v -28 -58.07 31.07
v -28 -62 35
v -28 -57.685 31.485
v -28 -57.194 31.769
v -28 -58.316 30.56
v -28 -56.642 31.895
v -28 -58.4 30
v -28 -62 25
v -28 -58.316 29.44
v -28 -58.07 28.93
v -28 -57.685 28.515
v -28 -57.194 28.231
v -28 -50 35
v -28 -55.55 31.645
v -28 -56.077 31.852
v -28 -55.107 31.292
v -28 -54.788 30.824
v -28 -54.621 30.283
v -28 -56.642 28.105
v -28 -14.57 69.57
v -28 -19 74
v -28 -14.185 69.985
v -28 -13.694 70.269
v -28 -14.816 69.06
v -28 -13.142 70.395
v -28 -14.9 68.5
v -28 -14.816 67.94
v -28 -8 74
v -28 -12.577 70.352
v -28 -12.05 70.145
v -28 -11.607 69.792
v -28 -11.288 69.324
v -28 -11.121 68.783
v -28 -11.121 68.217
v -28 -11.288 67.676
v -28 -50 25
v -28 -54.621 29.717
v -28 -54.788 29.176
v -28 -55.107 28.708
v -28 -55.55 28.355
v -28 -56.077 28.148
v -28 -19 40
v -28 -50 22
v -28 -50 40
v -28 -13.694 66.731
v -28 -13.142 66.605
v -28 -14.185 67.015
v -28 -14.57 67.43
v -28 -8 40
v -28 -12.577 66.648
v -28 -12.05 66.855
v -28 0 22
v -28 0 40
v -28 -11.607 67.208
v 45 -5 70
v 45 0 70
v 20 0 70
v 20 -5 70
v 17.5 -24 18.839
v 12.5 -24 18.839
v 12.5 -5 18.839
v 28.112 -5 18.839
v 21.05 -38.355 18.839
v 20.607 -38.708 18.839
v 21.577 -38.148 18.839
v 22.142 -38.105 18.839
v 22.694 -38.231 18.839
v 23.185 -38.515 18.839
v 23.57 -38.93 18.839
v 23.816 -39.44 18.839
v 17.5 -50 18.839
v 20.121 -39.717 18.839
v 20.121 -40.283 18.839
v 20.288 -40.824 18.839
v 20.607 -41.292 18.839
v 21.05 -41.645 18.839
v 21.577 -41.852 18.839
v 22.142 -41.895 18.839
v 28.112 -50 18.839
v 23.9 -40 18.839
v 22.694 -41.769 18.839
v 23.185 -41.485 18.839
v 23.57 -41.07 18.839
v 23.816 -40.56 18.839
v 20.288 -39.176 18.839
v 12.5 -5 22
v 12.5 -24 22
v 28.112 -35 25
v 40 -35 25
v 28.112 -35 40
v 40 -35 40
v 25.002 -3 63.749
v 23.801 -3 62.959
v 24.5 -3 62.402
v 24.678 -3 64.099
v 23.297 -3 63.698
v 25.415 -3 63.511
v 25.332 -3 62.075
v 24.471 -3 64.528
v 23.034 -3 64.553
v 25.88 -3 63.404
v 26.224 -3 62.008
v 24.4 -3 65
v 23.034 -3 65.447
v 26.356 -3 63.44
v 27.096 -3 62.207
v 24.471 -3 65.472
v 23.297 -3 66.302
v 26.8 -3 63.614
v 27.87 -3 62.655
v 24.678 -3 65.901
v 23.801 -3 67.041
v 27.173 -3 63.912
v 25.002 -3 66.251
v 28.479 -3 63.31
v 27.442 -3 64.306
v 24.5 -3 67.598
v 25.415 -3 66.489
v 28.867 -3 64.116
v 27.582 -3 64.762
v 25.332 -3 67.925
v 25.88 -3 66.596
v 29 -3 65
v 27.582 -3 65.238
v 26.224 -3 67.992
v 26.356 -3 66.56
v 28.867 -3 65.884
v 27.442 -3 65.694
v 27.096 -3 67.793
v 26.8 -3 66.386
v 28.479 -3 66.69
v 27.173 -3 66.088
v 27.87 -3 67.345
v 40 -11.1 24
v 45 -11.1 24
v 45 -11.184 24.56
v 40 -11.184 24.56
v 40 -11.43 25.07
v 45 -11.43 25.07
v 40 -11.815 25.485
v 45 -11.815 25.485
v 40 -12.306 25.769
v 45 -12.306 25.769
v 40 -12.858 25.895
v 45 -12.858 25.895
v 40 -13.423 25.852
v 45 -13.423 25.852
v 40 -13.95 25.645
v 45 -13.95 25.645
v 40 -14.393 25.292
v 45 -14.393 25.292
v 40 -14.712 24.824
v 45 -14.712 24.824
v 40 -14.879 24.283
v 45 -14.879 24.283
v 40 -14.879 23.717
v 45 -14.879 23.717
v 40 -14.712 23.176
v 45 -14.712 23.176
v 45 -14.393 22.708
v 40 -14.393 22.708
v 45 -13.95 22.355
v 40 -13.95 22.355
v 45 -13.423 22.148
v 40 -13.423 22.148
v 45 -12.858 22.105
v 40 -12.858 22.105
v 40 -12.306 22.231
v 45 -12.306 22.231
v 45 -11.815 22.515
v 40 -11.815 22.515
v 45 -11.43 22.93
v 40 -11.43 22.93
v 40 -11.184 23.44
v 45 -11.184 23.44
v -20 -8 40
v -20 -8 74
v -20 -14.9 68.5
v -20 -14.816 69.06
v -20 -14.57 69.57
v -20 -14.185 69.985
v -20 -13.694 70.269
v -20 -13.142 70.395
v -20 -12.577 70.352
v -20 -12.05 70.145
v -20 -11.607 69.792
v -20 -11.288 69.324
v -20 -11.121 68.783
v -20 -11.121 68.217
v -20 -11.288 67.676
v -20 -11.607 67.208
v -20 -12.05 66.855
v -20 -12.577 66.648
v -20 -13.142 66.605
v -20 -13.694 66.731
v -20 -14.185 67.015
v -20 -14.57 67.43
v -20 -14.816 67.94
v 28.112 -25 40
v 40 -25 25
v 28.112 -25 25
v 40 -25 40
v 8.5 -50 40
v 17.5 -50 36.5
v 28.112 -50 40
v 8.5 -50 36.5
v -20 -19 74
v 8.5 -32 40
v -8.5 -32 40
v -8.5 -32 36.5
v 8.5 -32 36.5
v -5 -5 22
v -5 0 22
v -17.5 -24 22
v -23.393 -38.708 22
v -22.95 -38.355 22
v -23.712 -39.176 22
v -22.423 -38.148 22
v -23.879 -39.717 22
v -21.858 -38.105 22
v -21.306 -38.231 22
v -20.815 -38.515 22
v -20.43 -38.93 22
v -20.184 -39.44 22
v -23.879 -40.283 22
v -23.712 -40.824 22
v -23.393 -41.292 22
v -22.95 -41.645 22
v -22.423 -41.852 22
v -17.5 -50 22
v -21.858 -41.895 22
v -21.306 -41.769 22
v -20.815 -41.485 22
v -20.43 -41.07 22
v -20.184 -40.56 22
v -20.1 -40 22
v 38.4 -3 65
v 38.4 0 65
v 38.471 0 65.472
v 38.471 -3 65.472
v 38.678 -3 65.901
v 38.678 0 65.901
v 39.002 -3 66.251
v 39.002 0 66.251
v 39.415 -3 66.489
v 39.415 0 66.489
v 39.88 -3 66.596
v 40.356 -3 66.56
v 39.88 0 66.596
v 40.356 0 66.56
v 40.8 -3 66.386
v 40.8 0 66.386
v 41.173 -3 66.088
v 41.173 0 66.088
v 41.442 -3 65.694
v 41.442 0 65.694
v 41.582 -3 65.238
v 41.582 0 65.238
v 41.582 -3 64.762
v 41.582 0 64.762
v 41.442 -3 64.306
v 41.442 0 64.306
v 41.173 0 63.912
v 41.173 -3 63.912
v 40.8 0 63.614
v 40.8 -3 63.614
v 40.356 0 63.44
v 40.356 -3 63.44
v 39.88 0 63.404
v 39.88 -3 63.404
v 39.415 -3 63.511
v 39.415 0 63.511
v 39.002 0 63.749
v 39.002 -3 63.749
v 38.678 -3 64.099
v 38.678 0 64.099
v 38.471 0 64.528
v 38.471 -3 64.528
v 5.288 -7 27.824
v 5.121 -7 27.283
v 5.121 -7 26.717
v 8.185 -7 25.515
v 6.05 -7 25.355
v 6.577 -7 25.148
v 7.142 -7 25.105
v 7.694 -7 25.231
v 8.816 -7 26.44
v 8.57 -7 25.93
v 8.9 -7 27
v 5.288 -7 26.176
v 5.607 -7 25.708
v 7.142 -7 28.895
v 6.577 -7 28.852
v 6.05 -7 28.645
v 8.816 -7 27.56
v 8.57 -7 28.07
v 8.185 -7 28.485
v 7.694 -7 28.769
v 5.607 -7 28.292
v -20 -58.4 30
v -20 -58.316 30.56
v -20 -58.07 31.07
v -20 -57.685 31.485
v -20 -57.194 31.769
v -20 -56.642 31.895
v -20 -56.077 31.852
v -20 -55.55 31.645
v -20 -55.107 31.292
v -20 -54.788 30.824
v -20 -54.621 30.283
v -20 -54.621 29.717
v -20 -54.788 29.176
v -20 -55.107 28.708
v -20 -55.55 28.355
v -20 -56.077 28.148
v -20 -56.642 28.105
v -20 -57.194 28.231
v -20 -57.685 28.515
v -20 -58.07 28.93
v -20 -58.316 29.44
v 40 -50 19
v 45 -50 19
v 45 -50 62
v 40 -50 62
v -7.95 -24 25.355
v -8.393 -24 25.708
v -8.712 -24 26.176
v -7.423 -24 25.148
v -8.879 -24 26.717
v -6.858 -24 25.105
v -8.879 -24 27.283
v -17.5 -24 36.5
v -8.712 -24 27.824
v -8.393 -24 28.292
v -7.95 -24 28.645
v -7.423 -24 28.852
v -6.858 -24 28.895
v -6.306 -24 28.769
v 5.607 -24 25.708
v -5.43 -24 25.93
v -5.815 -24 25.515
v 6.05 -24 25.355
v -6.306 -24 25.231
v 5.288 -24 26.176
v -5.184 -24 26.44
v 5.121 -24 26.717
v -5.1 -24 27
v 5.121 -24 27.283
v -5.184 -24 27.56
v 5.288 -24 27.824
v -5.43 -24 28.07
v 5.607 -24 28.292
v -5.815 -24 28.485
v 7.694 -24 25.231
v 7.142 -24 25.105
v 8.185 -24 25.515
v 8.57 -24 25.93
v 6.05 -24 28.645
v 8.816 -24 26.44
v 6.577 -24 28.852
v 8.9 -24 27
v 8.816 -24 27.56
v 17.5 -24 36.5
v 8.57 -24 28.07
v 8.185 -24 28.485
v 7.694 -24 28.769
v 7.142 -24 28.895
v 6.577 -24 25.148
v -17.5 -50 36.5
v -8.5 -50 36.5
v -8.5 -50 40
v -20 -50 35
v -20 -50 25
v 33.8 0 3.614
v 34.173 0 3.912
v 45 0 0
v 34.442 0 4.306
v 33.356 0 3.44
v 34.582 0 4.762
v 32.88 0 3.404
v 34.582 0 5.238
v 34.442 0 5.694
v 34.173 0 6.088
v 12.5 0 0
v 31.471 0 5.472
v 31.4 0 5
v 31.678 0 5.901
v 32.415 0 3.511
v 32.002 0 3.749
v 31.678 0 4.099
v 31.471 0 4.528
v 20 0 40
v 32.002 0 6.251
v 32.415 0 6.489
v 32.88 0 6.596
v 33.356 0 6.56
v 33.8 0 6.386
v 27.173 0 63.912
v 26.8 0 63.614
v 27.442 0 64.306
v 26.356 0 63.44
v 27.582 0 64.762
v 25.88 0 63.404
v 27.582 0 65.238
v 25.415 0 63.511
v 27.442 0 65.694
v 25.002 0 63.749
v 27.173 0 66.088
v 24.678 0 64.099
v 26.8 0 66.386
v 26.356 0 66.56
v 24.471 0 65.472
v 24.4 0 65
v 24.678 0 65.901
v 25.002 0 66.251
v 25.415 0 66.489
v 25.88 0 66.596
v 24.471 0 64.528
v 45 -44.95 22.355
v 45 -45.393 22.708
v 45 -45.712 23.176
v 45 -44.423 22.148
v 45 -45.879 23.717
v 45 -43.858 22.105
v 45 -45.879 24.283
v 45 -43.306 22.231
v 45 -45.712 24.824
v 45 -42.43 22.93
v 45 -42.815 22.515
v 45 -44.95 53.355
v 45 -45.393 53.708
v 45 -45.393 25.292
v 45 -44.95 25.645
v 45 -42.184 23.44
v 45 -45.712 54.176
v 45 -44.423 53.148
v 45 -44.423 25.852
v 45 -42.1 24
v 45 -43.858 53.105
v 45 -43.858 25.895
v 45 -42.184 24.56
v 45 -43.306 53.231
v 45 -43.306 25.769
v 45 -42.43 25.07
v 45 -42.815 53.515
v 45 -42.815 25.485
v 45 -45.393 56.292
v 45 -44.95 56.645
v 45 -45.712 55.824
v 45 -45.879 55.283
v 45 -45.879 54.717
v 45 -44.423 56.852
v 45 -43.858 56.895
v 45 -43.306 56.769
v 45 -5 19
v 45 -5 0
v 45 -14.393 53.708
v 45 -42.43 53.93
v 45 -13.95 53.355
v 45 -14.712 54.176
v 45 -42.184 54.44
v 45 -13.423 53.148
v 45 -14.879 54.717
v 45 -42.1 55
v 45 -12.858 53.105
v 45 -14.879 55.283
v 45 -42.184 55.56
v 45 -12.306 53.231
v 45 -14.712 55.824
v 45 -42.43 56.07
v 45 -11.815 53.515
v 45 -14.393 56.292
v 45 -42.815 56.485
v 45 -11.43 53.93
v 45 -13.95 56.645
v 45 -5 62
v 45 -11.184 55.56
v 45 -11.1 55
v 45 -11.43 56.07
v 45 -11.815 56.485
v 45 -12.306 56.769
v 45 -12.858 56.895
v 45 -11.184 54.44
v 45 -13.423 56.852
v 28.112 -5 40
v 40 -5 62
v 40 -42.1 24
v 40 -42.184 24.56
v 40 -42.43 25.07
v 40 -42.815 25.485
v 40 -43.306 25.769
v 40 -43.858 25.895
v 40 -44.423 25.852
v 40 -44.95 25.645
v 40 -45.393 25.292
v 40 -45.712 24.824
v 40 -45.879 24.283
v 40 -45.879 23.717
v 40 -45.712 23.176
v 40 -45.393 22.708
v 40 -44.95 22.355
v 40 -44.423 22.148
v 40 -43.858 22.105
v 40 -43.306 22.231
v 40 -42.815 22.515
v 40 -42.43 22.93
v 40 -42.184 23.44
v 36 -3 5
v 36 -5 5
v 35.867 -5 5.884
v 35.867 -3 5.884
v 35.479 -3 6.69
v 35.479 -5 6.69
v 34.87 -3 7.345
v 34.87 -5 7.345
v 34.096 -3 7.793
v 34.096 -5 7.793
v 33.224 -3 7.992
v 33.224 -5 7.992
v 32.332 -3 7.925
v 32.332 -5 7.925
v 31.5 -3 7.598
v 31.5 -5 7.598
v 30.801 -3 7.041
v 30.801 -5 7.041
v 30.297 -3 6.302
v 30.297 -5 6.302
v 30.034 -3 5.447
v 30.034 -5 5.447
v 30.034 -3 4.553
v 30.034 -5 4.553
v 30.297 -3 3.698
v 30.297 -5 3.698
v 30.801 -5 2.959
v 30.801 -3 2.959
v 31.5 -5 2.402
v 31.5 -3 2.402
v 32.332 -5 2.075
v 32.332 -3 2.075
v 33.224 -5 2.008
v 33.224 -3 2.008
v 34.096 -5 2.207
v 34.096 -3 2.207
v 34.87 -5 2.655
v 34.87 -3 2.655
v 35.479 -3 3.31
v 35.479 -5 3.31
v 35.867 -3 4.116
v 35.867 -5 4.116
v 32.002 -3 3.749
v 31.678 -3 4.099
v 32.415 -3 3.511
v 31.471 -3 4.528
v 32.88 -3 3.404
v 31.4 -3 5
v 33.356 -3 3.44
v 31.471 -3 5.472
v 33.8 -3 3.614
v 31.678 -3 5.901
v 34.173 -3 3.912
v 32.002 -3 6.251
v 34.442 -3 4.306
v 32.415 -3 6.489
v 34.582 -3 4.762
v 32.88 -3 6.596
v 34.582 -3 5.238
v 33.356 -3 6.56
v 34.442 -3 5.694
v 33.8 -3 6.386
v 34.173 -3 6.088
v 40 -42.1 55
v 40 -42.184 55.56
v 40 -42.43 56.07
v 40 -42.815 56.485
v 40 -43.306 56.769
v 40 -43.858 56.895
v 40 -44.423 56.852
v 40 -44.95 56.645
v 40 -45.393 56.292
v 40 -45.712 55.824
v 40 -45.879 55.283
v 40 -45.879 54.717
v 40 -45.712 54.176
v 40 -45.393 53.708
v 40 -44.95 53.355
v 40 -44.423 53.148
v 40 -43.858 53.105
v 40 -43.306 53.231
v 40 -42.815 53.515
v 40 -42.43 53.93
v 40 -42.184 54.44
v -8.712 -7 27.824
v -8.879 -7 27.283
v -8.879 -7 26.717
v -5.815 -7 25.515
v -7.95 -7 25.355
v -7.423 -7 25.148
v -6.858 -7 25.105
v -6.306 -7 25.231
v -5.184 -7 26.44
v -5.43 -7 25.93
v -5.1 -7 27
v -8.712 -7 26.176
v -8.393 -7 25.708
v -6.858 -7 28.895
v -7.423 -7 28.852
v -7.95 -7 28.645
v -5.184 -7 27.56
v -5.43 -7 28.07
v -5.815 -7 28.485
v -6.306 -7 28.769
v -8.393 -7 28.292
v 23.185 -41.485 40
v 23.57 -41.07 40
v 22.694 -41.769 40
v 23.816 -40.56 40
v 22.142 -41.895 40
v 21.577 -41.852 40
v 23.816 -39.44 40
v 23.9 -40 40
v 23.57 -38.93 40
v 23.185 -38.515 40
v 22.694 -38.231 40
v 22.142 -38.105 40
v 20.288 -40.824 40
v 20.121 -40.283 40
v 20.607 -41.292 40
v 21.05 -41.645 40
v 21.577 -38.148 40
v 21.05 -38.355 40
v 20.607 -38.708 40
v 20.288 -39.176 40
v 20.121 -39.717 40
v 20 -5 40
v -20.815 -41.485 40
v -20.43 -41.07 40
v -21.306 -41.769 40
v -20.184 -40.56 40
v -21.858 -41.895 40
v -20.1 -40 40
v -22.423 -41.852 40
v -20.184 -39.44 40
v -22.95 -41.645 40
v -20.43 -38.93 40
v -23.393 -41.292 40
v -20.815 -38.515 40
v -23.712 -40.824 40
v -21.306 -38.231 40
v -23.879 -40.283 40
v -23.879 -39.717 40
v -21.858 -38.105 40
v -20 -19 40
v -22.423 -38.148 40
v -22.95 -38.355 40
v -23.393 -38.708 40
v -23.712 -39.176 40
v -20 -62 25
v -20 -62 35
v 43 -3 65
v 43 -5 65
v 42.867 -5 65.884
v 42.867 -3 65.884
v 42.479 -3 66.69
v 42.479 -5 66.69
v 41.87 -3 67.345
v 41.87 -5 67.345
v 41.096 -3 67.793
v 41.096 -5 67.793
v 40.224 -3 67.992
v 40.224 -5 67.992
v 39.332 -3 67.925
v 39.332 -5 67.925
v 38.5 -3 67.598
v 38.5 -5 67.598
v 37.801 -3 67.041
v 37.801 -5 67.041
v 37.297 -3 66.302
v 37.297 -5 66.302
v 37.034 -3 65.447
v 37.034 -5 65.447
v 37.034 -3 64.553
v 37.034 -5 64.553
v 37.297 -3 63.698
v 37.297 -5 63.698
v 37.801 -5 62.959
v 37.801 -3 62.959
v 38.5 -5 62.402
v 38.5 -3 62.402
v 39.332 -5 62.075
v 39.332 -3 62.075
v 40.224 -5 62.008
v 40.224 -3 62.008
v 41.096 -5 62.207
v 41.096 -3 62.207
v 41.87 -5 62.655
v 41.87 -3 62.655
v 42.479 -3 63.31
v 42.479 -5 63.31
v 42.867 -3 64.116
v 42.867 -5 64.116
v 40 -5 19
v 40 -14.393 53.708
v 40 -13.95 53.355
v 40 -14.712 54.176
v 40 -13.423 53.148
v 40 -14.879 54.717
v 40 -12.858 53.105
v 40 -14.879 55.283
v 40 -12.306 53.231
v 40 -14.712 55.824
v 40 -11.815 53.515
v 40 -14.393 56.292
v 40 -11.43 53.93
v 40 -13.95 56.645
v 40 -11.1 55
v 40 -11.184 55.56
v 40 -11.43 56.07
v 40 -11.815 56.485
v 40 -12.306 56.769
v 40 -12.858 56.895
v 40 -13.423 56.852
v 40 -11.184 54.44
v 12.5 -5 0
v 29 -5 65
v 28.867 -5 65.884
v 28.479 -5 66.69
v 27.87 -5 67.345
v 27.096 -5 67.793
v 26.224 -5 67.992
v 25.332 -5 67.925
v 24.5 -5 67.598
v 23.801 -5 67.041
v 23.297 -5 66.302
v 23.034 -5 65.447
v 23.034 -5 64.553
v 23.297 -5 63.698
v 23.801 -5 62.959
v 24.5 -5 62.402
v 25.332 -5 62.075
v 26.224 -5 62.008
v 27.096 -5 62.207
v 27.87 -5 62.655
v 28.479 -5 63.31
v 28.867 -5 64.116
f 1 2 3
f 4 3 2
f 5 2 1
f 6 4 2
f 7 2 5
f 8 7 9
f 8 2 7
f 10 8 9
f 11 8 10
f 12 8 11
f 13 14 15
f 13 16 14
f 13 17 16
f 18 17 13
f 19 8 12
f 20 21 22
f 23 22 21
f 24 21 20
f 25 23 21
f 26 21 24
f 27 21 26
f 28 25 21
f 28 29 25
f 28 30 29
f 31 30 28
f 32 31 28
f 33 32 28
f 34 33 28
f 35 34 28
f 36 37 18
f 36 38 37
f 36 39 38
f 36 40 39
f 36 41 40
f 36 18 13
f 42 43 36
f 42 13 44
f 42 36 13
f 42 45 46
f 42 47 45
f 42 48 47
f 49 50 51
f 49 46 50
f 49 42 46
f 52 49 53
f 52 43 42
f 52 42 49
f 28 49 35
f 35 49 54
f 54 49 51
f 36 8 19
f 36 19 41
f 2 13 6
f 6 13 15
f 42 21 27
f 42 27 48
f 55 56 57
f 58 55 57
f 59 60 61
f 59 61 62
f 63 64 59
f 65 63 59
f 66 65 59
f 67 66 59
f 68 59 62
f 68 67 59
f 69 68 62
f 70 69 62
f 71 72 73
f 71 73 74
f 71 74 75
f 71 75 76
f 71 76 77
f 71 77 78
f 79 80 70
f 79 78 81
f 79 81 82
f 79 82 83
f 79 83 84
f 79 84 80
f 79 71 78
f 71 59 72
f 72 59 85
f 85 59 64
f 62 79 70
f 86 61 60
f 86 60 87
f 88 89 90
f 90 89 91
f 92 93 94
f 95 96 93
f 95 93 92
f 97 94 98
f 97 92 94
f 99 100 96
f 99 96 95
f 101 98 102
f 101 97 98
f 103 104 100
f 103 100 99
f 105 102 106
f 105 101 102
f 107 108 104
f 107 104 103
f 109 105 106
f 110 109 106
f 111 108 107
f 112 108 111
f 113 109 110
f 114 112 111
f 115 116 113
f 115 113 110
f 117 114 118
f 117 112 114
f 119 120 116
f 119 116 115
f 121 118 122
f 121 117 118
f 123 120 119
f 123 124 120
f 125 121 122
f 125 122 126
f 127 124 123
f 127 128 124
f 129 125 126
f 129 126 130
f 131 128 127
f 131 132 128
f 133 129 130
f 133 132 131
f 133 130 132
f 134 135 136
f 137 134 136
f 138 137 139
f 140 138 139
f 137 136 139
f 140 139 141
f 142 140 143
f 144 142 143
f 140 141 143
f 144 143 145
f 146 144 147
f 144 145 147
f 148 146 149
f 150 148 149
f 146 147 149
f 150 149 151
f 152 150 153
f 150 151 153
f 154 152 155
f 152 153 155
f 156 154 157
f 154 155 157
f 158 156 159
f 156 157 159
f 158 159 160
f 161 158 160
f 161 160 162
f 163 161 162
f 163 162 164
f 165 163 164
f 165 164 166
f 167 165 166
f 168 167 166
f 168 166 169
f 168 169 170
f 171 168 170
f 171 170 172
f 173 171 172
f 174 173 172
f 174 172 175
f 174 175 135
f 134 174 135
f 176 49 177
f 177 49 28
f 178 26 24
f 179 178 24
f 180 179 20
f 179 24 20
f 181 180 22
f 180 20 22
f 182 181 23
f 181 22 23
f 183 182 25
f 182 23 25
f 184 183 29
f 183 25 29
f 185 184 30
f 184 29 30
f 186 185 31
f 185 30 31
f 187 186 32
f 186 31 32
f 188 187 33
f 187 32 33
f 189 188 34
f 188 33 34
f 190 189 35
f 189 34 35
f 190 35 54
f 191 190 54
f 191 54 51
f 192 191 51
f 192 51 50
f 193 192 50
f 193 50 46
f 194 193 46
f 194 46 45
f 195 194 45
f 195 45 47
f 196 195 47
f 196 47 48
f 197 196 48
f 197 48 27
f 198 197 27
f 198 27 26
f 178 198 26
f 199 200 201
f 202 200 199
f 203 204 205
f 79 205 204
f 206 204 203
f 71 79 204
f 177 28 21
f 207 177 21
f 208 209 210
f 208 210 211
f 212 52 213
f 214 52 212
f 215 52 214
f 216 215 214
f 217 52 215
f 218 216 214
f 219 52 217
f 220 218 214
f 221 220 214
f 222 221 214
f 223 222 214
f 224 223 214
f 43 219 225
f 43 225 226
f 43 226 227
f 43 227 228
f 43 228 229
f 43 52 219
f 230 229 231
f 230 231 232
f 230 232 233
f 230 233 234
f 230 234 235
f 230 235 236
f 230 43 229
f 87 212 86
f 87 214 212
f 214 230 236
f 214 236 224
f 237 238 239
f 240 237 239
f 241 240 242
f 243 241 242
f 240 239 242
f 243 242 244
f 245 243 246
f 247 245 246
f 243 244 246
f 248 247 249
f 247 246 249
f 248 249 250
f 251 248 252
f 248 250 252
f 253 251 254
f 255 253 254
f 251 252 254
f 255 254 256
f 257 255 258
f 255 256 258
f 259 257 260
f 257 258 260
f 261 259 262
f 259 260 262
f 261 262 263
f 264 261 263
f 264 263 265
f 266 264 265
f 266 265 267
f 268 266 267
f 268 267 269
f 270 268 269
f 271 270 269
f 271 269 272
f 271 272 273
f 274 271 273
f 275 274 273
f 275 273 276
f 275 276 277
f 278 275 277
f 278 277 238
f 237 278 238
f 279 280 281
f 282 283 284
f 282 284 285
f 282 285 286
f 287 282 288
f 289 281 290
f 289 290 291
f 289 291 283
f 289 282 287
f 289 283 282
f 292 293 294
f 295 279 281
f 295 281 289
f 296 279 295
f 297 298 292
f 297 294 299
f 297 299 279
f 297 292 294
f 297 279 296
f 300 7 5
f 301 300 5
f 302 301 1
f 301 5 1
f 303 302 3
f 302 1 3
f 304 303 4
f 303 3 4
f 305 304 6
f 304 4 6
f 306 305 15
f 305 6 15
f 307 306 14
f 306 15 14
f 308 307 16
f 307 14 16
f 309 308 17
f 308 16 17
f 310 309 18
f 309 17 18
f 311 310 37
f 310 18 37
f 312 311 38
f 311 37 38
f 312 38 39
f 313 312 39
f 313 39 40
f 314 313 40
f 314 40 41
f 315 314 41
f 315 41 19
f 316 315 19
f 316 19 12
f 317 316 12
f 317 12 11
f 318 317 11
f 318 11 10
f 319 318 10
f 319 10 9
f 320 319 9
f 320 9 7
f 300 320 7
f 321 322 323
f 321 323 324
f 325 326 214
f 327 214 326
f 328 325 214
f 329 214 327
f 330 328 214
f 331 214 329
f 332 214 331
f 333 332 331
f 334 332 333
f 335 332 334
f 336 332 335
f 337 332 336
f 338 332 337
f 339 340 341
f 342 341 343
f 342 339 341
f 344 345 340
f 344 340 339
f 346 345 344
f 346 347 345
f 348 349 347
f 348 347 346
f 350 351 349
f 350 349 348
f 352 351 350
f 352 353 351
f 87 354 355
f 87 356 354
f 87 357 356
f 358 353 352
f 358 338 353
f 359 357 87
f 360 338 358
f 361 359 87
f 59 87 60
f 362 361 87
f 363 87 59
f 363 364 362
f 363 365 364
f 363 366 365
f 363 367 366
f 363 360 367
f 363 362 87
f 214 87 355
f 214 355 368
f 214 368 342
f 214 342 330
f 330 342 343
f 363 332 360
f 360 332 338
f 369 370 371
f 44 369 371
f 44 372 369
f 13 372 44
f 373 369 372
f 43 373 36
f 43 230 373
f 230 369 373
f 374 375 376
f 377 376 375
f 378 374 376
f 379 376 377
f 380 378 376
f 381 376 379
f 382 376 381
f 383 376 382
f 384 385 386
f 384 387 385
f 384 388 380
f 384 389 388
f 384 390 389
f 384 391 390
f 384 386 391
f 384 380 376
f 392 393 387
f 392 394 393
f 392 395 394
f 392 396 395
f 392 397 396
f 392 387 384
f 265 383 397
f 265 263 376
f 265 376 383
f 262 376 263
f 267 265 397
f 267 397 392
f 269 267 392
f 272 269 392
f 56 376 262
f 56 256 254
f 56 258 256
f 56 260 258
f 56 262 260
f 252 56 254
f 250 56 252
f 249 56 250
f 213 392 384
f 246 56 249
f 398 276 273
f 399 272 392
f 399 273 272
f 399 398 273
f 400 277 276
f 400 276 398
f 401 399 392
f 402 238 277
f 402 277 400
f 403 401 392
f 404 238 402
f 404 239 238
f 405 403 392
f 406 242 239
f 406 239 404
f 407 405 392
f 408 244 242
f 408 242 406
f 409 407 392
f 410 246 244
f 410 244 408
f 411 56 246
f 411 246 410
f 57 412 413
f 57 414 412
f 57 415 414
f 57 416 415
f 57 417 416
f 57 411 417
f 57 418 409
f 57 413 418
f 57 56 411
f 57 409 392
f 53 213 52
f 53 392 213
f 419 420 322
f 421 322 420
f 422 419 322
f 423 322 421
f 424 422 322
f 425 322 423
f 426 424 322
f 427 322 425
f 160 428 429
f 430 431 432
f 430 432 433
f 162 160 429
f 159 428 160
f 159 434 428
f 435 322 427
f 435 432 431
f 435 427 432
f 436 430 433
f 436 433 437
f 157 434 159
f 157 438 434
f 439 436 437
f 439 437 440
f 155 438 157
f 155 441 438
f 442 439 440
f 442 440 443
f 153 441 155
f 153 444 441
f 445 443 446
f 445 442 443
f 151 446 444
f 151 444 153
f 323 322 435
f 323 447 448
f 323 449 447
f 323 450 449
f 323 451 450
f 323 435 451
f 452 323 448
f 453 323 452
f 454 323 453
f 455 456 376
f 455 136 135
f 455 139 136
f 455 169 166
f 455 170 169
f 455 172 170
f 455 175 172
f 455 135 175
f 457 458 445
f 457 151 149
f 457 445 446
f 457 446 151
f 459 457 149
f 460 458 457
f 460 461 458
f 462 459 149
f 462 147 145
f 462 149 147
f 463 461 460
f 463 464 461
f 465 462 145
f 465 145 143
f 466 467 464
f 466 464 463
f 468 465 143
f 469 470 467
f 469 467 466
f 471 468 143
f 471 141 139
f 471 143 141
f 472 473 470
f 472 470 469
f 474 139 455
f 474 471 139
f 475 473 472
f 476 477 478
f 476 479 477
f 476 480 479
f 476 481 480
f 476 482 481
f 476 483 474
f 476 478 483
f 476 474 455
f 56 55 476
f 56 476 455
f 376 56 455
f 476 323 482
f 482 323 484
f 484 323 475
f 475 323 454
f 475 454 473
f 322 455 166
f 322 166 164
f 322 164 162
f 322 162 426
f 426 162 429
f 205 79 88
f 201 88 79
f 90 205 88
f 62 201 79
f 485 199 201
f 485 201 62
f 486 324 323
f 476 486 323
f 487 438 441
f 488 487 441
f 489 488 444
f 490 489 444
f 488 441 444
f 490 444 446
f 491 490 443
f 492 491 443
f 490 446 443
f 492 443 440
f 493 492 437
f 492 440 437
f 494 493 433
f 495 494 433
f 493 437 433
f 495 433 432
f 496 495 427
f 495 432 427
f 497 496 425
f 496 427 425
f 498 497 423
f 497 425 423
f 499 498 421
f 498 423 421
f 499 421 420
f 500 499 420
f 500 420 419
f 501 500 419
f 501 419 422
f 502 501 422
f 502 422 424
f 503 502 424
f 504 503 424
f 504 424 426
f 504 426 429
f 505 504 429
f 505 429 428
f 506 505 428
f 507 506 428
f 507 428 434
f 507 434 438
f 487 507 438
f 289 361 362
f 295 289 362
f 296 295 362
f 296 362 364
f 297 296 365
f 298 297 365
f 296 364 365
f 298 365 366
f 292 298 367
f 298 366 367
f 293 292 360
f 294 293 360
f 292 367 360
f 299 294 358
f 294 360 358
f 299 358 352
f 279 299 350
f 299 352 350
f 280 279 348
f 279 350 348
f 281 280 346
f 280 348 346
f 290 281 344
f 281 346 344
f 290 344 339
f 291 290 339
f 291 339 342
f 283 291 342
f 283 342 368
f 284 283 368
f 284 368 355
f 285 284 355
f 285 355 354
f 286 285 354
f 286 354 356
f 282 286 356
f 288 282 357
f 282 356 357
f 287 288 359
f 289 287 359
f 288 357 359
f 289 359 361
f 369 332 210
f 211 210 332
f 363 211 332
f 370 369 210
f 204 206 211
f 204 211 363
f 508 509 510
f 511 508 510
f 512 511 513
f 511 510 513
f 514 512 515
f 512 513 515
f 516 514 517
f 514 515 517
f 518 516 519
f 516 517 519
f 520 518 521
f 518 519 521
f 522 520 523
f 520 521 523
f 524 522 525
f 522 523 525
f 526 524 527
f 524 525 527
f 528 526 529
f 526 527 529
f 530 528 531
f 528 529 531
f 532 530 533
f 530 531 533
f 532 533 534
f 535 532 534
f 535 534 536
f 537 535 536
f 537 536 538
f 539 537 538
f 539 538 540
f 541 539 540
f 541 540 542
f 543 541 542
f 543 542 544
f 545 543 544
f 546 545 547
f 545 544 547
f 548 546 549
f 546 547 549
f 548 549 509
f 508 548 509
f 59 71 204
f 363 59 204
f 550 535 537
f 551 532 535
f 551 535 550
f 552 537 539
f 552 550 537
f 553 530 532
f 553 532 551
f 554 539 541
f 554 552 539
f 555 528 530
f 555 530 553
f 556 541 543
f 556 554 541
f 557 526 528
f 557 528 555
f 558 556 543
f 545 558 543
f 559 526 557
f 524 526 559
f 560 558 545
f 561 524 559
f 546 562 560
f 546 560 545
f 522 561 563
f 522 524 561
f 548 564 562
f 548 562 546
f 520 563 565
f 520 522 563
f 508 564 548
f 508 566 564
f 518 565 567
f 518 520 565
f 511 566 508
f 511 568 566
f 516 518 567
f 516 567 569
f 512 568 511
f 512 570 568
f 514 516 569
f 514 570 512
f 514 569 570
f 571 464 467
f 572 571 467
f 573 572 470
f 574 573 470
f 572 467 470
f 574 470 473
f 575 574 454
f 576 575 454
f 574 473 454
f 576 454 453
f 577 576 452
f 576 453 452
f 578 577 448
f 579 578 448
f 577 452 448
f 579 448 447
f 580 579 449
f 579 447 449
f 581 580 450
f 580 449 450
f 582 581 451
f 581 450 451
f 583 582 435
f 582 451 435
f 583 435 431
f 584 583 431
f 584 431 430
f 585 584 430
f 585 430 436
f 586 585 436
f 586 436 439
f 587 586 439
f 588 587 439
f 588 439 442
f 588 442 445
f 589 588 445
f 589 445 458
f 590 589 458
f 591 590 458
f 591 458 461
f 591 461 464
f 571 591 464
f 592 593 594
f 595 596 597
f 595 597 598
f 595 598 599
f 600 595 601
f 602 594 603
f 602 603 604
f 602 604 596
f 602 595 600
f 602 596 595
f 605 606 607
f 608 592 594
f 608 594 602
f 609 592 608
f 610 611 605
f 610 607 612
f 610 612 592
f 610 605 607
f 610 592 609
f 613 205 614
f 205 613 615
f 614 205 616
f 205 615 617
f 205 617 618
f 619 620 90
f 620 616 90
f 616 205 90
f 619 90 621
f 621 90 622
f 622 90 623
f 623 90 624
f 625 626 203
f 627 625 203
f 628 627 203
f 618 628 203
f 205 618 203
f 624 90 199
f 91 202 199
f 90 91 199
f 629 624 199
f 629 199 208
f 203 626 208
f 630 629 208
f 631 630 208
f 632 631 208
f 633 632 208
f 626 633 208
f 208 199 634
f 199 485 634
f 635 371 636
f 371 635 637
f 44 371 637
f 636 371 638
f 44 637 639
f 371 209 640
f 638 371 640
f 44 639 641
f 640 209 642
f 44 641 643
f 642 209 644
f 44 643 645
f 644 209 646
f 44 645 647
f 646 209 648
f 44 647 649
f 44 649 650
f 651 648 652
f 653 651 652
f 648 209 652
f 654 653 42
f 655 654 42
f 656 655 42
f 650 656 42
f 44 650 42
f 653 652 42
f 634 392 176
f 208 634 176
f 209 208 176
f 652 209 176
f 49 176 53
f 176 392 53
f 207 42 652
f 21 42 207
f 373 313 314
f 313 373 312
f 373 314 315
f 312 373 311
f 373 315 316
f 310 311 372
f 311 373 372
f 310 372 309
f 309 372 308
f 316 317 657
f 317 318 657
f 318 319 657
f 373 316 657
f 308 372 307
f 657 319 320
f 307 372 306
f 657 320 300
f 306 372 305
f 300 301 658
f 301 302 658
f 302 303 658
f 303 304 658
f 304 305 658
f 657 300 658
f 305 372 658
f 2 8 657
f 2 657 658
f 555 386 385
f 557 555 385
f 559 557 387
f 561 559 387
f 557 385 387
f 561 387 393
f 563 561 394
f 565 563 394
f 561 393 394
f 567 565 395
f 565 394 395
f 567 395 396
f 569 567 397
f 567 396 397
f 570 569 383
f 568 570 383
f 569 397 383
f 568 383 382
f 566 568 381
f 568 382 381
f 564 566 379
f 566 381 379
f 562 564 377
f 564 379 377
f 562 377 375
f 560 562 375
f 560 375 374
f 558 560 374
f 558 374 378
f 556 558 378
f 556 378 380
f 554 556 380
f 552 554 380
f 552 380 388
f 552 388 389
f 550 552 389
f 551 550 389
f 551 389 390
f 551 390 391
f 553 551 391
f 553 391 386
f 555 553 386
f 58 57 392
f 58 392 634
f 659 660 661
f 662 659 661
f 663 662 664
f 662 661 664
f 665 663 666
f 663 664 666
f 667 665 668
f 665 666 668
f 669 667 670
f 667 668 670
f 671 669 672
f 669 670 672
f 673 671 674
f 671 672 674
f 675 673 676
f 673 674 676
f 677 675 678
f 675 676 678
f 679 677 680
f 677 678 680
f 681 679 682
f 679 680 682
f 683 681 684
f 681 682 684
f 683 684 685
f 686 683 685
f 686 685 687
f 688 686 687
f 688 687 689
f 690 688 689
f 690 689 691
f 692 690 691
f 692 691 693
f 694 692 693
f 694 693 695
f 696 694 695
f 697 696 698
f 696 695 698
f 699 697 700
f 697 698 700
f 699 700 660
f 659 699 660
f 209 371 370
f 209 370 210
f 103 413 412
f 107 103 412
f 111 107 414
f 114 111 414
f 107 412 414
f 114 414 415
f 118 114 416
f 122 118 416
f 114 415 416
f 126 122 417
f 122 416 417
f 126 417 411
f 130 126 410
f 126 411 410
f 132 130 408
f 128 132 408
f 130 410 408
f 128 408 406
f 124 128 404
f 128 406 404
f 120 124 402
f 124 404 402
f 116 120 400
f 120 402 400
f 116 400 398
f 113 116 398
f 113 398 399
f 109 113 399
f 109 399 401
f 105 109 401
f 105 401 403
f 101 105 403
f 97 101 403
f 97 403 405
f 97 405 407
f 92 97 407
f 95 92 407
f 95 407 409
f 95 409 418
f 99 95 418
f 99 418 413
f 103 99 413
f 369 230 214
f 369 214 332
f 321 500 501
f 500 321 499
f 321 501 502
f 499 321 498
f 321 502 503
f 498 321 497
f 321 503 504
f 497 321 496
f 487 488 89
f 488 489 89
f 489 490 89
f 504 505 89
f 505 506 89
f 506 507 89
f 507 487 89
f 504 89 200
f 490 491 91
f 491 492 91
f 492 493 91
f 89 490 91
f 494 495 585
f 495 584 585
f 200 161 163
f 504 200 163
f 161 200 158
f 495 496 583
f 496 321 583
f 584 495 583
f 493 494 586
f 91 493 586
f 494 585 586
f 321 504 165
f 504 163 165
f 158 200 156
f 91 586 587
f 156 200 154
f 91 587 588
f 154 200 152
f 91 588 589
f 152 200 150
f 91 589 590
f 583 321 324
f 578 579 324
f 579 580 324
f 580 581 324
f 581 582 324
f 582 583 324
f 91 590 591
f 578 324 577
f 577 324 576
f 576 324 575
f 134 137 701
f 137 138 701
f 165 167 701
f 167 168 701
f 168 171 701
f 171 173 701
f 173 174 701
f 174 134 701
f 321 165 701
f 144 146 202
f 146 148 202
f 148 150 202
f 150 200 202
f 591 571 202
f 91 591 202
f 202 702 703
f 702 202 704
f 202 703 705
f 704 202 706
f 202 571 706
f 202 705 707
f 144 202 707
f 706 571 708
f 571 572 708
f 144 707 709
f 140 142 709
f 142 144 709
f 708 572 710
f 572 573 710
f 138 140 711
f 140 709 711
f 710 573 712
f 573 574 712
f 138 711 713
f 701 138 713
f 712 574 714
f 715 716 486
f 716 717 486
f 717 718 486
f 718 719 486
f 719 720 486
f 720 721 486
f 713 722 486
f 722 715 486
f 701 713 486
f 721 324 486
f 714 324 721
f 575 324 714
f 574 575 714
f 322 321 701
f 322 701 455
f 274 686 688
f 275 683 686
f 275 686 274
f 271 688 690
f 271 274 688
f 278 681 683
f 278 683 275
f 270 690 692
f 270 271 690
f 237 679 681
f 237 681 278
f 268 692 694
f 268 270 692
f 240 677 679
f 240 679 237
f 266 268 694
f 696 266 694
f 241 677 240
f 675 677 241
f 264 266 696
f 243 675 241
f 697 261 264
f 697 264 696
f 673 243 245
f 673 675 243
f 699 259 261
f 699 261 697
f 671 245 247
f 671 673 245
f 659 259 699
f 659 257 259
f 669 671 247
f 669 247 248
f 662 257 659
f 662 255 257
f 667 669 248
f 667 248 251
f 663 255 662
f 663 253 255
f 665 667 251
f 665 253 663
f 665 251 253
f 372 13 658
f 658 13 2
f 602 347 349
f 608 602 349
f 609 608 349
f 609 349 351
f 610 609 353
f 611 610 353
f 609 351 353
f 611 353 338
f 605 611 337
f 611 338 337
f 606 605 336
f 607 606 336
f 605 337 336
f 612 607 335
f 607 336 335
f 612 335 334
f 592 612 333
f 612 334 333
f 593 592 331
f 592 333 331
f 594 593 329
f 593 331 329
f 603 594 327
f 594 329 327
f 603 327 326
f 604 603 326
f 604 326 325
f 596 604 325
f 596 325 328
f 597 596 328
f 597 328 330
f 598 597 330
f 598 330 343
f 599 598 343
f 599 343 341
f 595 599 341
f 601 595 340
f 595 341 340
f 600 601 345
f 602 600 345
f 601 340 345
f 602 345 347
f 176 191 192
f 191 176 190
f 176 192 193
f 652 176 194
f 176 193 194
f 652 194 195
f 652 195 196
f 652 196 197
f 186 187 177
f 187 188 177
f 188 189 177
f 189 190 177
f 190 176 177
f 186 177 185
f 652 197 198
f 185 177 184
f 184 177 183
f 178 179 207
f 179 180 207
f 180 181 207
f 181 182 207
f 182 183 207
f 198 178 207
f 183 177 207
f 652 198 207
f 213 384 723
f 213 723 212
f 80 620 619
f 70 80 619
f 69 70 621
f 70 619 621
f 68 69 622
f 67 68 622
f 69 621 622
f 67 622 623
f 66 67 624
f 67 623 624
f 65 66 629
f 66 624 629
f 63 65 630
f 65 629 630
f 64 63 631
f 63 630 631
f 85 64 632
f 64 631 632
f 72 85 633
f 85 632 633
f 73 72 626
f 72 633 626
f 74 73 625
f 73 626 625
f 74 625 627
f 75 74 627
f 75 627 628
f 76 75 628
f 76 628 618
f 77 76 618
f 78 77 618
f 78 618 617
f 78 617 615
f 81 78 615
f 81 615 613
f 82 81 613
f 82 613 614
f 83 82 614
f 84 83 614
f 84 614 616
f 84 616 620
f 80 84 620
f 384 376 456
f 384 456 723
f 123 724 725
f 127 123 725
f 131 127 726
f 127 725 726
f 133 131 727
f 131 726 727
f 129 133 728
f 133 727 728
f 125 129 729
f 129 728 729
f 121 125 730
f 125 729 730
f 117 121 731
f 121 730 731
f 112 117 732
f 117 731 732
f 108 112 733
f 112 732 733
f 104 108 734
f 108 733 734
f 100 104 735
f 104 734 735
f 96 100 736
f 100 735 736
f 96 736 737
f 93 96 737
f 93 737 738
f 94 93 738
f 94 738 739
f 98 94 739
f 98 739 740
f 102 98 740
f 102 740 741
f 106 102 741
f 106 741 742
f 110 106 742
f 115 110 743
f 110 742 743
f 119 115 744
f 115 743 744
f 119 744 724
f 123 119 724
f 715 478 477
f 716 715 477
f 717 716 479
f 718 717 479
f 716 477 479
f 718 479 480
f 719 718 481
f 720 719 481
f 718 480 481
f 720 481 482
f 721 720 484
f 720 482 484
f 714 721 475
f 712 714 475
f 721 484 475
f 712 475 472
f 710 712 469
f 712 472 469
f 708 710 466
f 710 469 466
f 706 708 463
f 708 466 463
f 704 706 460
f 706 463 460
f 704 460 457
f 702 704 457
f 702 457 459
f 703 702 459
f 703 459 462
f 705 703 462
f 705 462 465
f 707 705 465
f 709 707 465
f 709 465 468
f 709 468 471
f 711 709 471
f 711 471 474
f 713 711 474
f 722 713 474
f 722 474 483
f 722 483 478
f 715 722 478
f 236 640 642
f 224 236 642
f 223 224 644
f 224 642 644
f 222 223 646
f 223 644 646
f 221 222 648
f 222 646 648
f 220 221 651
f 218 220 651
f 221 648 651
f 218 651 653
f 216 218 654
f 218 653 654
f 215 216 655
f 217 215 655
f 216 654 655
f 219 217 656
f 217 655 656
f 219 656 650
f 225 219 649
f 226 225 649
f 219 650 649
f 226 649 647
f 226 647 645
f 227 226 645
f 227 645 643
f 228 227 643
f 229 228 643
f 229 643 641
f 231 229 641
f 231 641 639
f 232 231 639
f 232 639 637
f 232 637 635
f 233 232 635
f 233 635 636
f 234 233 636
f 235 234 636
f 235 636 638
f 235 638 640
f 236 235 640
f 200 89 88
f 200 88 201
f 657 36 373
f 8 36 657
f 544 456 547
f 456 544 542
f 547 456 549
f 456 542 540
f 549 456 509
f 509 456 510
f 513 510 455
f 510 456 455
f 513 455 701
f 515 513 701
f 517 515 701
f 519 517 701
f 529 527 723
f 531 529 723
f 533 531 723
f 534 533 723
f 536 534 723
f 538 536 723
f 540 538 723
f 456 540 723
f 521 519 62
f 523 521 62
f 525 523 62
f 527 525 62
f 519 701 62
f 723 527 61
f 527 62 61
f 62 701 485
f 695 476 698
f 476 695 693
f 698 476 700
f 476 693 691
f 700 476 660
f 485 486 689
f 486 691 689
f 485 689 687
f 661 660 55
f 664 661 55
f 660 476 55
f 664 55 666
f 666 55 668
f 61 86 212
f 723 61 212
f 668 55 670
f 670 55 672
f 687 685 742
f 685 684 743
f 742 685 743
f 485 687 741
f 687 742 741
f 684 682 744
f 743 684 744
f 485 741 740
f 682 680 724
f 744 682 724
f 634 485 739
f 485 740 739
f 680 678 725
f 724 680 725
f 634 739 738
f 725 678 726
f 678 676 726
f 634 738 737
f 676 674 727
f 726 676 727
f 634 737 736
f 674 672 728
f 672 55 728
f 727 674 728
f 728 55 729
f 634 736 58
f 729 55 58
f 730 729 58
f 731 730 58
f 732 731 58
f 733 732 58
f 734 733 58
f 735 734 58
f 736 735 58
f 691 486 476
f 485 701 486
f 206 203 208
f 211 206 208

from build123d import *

# Parameters (mm, degrees)
PAD_DEPTH            = 70
SKETCH001_W          = 11.887794
SKETCH001_H          = 46.78
POCKET_DEPTH         = 70.001
POCKET001_DEPTH      = 30
SKETCH003_R          = 1.9
POCKET002_DEPTH      = 40.001
SKETCH004_W          = 17
SKETCH004_H          = 23.314381
POCKET003_DEPTH      = 40.001
SKETCH005_W          = 35
SKETCH005_H          = 57.974789
POCKET004_DEPTH      = 26
SKETCH006_W          = 45.255611
SKETCH006_H          = 30.428207
POCKET005_DEPTH      = 28
POCKET005_DEPTH_BACK = -100
SKETCH007_W          = 26.242121
SKETCH007_H          = 29.741062
POCKET006_DEPTH      = 45
SKETCH008_W          = 15.625622
SKETCH008_H          = 14.392597
SKETCH008_W_2        = 24.610352
SKETCH008_H_2        = 31.67345
POCKET007_DEPTH      = 45
SKETCH009_R          = 1.9
POCKET008_DEPTH      = 13
SKETCH010_R          = 1.6
POCKET009_DEPTH      = 5
SKETCH014_W          = 10
SKETCH014_H          = 15
PAD001_DEPTH         = 23
SKETCH015_W          = 11
SKETCH015_H          = 38.184422
SKETCH015_W_2        = 19.881198
SKETCH015_H_2        = 10
PAD002_DEPTH         = 8
SKETCH013_R          = 1.9
POCKET010_DEPTH      = 17
SKETCH011_R          = 1.9
POCKET011_DEPTH      = 15
PAD003_DEPTH         = 5
SKETCH017_R          = 3
POCKET012_DEPTH      = 2


with BuildPart() as part:
    # Sketch → Pad (new body)
    with BuildSketch(Plane.XY):
        Polygon((0, 0), (45, 0), (45, -50), (-28, -50), (-28, 0), align=None)
    extrude(amount=PAD_DEPTH)

    # Sketch001 (on Face7 of Pad) → Pocket (cut, through all)
    with BuildSketch(Plane.XY.offset(70)):
        with Locations((34.056103, -28.39)):
            Rectangle(SKETCH001_W, SKETCH001_H)
    extrude(amount=-POCKET_DEPTH, mode=Mode.SUBTRACT)

    # Sketch002 (on Face5 of Pocket) → Pocket001 (cut)
    with BuildSketch(Plane.XY.offset(70)):
        Polygon((30, -5), (30, -65.096024), (-40.783405, -65.096024), (-40.783405, 12.994774), (20, 12.994774), (20, -5), align=None)
    extrude(amount=-POCKET001_DEPTH, mode=Mode.SUBTRACT)

    # Sketch003 (on Face6 of Pocket001) → Pocket002 (cut, through all)
    with BuildSketch(Plane.XY.offset(40)):
        with Locations((-22, -40)):
            Circle(SKETCH003_R)
        with Locations((22, -40)):
            Circle(SKETCH003_R)
    extrude(amount=-POCKET002_DEPTH, mode=Mode.SUBTRACT)

    # Sketch004 (on Face6 of Pocket002) → Pocket003 (cut, through all)
    with BuildSketch(Plane.XY.offset(40)):
        with Locations((0, -43.65719)):
            Rectangle(SKETCH004_W, SKETCH004_H)
    extrude(amount=-POCKET003_DEPTH, mode=Mode.SUBTRACT)

    # Sketch005 (on Face13 of Pocket003) → Pocket004 (cut)
    with BuildSketch(Plane.XZ.offset(50)):
        with Locations((0, 7.512606)):
            Rectangle(SKETCH005_W, SKETCH005_H)
    extrude(amount=-POCKET004_DEPTH, mode=Mode.SUBTRACT)

    # Sketch006 (on Face11 of Pocket004) → Pocket005 (cut, two sides)
    with BuildSketch(Plane.XZ.offset(24)) as pocket005_sk:
        with Locations((-10.127806, 6.785896)):
            Rectangle(SKETCH006_W, SKETCH006_H)
    extrude(amount=-POCKET005_DEPTH, mode=Mode.SUBTRACT)
    extrude(pocket005_sk.sketch, amount=-POCKET005_DEPTH_BACK, mode=Mode.SUBTRACT)

    # Sketch007 (on Face12 of Pocket005) → Pocket006 (cut)
    with BuildSketch(Plane.XZ.offset(50)):
        with Locations((20.733142, 3.968048)):
            Rectangle(SKETCH007_W, SKETCH007_H)
    extrude(amount=-POCKET006_DEPTH, mode=Mode.SUBTRACT)

    # Sketch008 (on Face14 of Pocket006) → Pocket007 (cut)
    with BuildSketch(Plane.XZ.offset(50)):
        with Locations((42.909006, 69.196298)):
            Rectangle(SKETCH008_W, SKETCH008_H)
        with Locations((46.359665, 3.163275)):
            Rectangle(SKETCH008_W_2, SKETCH008_H_2)
    extrude(amount=-POCKET007_DEPTH, mode=Mode.SUBTRACT)

    # Sketch009 (on Face3 of Pocket007) → Pocket008 (cut)
    with BuildSketch(Plane.YZ.offset(45)):
        with Locations((-44, 55)):
            Circle(SKETCH009_R)
        with Locations((-13, 24)):
            Circle(SKETCH009_R)
        with Locations((-13, 55)):
            Circle(SKETCH009_R)
        with Locations((-44, 24)):
            Circle(SKETCH009_R)
    extrude(amount=-POCKET008_DEPTH, mode=Mode.SUBTRACT)

    # Sketch010 (on Face1 of Pocket008) → Pocket009 (cut)
    with BuildSketch(Plane(origin=(0, 0, 0), x_dir=(-1, 0, 0), z_dir=(0, 1, 0))):
        with Locations((-33, 5)):
            Circle(SKETCH010_R)
        with Locations((-40, 65)):
            Circle(SKETCH010_R)
        with Locations((-26, 65)):
            Circle(SKETCH010_R)
    extrude(amount=-POCKET009_DEPTH, mode=Mode.SUBTRACT)

    # Sketch014 (on Face4 of Pocket009) → Pad001 (join)
    with BuildSketch(Plane.YZ.offset(45)):
        with Locations((-30, 32.5)):
            Rectangle(SKETCH014_W, SKETCH014_H)
    extrude(amount=-PAD001_DEPTH)

    # Sketch015 (on Face29 of Pad001) → Pad002 (join)
    with BuildSketch(Plane(origin=(-28, 0, 0), x_dir=(0, -1, 0), z_dir=(-1, 0, 0))):
        with Locations((13.5, 54.907789)):
            Rectangle(SKETCH015_W, SKETCH015_H)
        with Locations((52.059401, 30)):
            Rectangle(SKETCH015_W_2, SKETCH015_H_2)
    extrude(amount=-PAD002_DEPTH)

    # Sketch013 (on Face19 of Pad002) → Pocket010 (cut)
    with BuildSketch(Plane.XZ.offset(24)):
        with Locations((-7, 27)):
            Circle(SKETCH013_R)
        with Locations((7, 27)):
            Circle(SKETCH013_R)
    extrude(amount=-POCKET010_DEPTH, mode=Mode.SUBTRACT)

    # Sketch011 (on Face29 of Pad002) → Pocket011 (cut)
    with BuildSketch(Plane(origin=(-28, 0, 0), x_dir=(0, -1, 0), z_dir=(-1, 0, 0))):
        with Locations((56.5, 30)):
            Circle(SKETCH011_R)
        with Locations((13, 68.5)):
            Circle(SKETCH011_R)
    extrude(amount=-POCKET011_DEPTH, mode=Mode.SUBTRACT)

    # Sketch016 (on Face1 of Pocket011) → Pad003 (join)
    with BuildSketch(Plane(origin=(0, 0, 0), x_dir=(-1, 0, 0), z_dir=(0, 1, 0))):
        Polygon((-12.5, 0), (5, 22), (-15.71, 22), align=None)
    extrude(amount=-PAD003_DEPTH)

    # Sketch017 (on Face28 of Pad003) → Pocket012 (cut)
    with BuildSketch(Plane.XZ.offset(5)):
        with Locations((26, 65)):
            Circle(SKETCH017_R)
        with Locations((33, 5)):
            Circle(SKETCH017_R)
        with Locations((40, 65)):
            Circle(SKETCH017_R)
    extrude(amount=-POCKET012_DEPTH, mode=Mode.SUBTRACT)


solid = part.part
